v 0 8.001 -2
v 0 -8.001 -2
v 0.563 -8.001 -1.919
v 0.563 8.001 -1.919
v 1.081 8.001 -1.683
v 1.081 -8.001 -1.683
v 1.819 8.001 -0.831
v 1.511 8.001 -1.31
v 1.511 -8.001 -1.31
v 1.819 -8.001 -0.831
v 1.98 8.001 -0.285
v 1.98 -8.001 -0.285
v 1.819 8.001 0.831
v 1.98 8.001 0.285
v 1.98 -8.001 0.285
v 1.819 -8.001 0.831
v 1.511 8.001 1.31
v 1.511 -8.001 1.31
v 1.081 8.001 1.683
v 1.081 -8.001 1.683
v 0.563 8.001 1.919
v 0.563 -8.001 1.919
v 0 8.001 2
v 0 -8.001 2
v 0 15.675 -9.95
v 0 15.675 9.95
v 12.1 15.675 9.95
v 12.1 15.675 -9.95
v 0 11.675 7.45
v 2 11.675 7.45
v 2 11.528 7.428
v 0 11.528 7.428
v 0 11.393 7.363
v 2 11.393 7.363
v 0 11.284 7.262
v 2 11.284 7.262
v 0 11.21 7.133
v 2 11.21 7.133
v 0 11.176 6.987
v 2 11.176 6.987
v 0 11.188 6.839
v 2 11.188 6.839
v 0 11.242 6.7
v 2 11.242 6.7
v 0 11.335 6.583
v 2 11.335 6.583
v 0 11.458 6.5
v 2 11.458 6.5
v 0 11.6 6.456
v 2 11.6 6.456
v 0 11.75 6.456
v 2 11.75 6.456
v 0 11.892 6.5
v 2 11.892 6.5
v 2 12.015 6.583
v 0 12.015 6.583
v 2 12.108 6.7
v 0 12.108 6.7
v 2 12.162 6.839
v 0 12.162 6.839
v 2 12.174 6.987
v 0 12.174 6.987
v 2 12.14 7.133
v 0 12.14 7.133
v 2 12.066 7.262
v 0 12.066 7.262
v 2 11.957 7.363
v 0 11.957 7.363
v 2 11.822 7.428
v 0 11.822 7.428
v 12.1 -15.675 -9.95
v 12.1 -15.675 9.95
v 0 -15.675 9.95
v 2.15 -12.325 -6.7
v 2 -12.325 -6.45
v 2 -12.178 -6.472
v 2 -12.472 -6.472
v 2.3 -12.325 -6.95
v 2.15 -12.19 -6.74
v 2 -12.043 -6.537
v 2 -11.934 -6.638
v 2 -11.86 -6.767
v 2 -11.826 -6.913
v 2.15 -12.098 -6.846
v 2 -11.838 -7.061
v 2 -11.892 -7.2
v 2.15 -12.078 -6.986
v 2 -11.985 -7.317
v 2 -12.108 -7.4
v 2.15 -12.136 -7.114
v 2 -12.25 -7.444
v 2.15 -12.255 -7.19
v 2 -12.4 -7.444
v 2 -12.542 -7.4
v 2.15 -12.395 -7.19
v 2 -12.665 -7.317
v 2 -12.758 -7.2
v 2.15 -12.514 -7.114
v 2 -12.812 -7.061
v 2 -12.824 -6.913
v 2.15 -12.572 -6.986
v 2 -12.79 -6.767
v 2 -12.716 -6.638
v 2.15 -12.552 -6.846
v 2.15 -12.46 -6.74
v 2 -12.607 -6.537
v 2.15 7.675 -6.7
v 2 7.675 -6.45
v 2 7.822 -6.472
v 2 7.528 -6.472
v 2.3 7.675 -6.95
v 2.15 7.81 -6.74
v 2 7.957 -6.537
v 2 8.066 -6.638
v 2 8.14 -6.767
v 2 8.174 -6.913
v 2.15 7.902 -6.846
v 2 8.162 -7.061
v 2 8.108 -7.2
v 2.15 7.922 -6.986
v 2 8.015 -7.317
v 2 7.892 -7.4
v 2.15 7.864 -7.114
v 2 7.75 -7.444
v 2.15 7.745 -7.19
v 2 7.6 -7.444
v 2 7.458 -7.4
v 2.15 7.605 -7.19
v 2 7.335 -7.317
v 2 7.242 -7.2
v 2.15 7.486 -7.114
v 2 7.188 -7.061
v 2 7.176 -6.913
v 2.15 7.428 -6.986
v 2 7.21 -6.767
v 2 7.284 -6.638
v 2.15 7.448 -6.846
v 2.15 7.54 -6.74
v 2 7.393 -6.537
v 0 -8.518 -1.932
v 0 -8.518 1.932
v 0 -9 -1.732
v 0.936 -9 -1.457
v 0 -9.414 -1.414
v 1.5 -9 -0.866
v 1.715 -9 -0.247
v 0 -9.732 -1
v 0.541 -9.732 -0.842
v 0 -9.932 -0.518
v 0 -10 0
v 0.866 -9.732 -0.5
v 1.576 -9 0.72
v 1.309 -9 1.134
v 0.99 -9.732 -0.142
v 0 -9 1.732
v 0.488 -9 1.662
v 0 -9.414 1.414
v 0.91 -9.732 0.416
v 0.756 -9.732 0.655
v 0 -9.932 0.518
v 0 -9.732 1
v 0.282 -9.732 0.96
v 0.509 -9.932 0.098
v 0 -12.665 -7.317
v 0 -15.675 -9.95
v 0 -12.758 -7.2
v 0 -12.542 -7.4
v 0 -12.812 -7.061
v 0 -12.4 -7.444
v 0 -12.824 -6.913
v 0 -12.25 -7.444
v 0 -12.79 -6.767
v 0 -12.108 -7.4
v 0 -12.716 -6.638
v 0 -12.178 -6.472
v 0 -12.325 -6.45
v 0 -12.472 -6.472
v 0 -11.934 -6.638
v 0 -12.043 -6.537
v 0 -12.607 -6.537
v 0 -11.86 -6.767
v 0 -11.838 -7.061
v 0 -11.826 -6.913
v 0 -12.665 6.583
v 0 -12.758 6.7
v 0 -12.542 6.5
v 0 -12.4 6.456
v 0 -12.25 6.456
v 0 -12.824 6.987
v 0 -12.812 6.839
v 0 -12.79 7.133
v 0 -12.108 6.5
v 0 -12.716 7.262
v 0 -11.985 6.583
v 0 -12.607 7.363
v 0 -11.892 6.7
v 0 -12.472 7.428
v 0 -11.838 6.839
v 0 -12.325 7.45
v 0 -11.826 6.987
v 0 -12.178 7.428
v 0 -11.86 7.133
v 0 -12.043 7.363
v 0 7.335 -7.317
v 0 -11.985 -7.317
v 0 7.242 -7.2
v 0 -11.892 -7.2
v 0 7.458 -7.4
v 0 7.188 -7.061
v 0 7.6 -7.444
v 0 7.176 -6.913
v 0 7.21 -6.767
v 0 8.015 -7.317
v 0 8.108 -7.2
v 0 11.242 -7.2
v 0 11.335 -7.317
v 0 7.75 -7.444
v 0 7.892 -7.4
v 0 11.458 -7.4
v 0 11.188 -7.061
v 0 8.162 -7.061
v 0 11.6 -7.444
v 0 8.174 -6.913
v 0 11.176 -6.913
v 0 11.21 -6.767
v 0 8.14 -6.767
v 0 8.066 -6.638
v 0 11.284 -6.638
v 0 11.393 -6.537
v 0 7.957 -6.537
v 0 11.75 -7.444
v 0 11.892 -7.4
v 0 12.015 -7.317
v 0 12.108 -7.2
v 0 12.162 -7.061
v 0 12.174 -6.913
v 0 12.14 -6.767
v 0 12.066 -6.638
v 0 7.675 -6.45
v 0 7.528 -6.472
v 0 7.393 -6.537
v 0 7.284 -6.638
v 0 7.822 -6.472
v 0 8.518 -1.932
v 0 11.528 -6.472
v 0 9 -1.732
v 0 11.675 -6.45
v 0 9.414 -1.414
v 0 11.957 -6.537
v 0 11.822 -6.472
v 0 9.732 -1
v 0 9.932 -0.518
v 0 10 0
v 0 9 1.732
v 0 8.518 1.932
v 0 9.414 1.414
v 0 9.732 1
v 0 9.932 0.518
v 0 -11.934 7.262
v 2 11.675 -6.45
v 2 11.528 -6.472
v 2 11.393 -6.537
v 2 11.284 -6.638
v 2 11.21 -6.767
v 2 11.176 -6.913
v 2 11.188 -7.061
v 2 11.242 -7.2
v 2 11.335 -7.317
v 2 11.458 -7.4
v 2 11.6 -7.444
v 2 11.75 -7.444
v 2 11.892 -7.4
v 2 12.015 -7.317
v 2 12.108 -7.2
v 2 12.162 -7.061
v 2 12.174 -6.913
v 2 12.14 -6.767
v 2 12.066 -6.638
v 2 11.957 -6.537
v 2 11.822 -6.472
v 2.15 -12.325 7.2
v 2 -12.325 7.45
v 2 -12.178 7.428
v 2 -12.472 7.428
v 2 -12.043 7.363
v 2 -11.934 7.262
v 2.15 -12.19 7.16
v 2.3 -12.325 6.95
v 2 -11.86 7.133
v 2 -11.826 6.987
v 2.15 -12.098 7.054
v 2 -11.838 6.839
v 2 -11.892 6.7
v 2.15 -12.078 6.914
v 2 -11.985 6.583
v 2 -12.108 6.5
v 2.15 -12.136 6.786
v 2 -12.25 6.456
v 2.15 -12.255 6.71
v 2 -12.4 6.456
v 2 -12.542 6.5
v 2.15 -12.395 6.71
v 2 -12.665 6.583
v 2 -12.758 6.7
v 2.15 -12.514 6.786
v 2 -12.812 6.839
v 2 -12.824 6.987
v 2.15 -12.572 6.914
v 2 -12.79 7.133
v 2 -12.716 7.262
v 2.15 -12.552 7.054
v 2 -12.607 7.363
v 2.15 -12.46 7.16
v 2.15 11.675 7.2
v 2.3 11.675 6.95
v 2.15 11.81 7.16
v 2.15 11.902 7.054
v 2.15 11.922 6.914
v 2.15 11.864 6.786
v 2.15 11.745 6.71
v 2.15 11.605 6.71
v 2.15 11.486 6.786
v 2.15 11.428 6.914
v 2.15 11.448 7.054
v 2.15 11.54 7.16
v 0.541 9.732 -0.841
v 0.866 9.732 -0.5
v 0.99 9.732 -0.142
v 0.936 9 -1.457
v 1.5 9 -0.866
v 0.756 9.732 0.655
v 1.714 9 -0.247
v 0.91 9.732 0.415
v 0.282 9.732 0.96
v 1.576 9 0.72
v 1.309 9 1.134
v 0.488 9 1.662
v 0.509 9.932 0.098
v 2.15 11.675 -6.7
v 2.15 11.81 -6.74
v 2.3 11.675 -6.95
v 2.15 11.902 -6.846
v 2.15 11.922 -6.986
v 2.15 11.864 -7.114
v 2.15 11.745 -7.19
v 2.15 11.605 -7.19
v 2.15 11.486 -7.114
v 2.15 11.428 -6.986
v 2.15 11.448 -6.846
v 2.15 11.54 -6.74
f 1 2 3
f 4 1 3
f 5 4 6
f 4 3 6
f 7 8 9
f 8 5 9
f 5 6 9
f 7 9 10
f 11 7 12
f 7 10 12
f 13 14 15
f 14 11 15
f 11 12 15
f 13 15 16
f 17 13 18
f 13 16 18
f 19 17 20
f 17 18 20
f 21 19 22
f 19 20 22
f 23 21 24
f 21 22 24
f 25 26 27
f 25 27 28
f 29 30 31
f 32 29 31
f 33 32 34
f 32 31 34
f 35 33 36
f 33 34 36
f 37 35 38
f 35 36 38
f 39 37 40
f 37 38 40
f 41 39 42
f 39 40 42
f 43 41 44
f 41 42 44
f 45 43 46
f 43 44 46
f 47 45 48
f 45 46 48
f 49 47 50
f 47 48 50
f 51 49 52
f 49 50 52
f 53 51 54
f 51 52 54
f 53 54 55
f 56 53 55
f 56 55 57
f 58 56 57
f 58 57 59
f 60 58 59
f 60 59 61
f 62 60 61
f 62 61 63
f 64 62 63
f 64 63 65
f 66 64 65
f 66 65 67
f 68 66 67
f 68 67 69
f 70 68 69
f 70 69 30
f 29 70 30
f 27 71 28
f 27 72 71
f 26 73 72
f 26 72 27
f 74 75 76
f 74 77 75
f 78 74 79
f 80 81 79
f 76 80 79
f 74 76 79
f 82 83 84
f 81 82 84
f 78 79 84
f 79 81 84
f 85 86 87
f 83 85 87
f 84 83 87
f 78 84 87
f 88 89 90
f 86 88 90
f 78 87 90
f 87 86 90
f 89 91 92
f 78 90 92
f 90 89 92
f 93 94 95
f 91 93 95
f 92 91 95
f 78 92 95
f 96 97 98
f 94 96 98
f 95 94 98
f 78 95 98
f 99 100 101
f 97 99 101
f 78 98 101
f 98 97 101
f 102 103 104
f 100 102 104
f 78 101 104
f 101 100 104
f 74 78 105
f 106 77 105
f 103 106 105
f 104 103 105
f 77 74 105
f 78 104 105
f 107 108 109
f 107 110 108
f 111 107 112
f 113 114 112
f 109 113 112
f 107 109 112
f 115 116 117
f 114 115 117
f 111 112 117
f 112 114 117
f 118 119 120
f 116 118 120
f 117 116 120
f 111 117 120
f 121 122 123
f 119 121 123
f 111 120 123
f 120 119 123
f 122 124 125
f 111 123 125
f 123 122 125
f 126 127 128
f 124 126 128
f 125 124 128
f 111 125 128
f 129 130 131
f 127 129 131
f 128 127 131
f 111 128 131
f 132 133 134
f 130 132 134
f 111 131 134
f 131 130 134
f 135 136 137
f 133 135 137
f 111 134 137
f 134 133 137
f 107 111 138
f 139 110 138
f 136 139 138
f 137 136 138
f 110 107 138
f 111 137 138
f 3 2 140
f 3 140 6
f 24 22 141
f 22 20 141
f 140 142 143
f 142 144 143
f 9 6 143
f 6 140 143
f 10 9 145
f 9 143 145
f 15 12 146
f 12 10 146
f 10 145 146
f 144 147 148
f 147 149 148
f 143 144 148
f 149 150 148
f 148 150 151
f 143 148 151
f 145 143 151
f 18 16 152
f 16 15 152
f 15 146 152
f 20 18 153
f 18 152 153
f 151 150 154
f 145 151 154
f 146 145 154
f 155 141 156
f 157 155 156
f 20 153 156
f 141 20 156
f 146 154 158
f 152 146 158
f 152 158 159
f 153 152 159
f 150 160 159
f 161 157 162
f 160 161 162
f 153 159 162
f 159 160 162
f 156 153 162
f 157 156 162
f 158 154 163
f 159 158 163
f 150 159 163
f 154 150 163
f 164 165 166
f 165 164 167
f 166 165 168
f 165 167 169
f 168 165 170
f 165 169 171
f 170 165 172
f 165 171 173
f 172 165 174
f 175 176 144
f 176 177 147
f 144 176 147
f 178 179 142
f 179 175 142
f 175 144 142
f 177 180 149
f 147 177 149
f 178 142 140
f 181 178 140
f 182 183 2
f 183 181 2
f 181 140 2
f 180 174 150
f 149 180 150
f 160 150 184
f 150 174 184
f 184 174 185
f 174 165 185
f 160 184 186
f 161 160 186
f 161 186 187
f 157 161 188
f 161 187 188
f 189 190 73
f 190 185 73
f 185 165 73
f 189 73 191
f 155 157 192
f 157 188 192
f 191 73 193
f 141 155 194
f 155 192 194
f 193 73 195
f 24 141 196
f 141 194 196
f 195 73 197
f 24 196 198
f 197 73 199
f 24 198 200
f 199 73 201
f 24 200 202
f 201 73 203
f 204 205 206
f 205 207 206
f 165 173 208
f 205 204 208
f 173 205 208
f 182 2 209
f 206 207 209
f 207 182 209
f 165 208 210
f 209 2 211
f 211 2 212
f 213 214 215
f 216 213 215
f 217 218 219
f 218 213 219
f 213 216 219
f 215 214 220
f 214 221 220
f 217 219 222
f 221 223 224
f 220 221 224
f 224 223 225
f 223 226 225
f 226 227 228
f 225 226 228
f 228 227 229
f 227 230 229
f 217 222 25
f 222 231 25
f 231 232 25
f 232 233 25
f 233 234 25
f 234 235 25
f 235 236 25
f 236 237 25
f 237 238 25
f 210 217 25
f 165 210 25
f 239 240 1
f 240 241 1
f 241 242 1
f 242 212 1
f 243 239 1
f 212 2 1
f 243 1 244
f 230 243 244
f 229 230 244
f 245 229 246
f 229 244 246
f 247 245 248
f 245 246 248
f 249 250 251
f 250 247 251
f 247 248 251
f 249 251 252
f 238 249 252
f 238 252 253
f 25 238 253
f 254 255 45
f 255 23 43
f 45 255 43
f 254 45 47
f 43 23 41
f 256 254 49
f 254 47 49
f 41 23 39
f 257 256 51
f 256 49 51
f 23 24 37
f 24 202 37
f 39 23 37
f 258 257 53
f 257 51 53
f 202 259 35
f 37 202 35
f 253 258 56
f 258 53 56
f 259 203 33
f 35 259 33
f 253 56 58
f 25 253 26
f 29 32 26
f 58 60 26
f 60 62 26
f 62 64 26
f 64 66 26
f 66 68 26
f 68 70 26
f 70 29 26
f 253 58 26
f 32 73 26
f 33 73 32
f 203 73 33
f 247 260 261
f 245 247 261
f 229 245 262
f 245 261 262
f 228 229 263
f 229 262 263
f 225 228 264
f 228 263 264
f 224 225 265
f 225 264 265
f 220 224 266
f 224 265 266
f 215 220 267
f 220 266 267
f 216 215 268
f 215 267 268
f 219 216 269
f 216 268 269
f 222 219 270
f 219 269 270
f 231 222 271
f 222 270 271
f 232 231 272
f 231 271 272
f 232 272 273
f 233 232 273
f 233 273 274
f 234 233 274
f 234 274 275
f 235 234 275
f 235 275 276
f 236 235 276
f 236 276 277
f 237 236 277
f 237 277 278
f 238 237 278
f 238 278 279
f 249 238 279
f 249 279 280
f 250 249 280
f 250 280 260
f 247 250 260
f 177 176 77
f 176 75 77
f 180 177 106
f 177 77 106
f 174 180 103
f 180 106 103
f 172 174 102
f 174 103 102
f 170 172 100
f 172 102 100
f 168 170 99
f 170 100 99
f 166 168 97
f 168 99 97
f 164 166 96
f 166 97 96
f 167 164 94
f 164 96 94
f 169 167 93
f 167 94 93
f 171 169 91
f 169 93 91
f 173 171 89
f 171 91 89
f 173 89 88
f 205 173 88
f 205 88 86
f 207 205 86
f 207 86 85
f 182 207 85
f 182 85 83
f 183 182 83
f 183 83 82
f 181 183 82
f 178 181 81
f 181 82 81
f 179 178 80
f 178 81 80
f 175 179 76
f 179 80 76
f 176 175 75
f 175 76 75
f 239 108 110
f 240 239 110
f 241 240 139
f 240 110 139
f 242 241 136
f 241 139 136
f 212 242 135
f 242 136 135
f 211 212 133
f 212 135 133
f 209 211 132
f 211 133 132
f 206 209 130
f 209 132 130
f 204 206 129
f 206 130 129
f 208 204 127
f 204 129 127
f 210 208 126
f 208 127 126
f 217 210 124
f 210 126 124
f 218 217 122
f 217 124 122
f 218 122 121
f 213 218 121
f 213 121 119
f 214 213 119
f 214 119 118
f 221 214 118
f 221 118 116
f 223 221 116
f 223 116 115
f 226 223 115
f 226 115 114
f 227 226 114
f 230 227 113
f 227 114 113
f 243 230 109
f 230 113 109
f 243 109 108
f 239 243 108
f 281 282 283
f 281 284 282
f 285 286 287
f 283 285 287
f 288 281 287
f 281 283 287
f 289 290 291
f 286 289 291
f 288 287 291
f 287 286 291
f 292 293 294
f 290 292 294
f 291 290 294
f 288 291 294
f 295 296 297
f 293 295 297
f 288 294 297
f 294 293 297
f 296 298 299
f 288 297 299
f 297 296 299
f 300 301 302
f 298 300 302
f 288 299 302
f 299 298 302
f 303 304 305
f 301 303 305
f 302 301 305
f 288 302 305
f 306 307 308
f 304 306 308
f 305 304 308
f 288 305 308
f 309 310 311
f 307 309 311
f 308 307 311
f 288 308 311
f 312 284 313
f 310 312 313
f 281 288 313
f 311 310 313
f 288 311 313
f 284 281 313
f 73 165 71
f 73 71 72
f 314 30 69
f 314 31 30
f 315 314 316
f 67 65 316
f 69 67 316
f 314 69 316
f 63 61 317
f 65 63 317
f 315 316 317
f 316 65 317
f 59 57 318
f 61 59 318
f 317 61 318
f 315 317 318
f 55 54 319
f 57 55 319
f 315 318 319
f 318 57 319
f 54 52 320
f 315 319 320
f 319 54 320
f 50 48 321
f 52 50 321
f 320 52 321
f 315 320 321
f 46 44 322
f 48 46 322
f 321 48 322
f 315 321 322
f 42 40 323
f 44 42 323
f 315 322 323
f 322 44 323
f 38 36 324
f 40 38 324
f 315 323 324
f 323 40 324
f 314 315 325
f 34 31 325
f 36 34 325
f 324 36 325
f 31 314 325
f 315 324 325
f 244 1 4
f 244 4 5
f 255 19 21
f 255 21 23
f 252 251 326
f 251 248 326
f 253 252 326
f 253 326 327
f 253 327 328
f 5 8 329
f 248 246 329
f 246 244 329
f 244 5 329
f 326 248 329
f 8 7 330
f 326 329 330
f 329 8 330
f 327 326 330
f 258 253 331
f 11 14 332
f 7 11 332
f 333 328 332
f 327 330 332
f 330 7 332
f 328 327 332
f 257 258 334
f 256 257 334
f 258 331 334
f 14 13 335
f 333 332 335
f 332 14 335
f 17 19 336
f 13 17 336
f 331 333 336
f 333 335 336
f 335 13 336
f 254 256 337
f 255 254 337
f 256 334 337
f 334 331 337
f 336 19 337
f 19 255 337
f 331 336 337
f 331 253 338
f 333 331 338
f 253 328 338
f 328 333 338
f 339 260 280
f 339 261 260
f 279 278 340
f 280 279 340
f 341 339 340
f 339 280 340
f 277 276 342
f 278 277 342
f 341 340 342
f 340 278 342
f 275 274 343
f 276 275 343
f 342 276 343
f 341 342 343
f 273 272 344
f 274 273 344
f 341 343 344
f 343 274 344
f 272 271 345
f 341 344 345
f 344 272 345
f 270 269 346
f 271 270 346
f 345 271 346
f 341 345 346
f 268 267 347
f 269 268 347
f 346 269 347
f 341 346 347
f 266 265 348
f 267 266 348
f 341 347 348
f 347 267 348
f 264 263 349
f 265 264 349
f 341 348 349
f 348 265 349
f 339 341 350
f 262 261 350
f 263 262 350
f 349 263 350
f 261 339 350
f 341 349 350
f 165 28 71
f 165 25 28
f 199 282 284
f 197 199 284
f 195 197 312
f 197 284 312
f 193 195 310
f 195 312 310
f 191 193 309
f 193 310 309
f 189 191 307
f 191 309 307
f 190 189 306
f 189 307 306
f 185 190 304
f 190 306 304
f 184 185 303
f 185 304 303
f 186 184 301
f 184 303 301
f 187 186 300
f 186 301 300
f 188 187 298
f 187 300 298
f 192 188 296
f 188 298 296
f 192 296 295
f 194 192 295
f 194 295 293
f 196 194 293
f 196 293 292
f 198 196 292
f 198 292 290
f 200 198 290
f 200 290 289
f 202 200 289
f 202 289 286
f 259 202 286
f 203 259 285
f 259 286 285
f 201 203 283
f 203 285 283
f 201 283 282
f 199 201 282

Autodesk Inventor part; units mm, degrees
ref_plane "YZ Plane" through (0, 0, 0) normal (1, 0, 0) x (0, 1, 0)
ref_plane "XZ Plane" through (0, 0, 0) normal (0, 1, 0) x (-1, 0, 0)
ref_plane "XY Plane" through (0, 0, 0) normal (0, 0, 1) x (1, 0, 0)
sketch "Skizze4" plane through (0, 0, 0) normal (1, 0, 0) x (0, 1, 0)
  line L0 (-15.675, 9.95) -> (15.675, 9.95)
  line L1 (15.675, 9.95) -> (15.675, -9.95)
  line L2 (15.675, -9.95) -> (-15.675, -9.95)
  line L3 (-15.675, -9.95) -> (-15.675, 9.95)
  line L4 (0, -13.93) -> (0, 13.93) construction
  line L5 (-21.945, 0) -> (21.945, 0) construction
  point P0 (0, 0)
  dimension "d4" = 31.35
  dimension "d5" = 19.9
extrude "Extrusion2" add sketch "Skizze4" along normal blind 12.1
sketch "Skizze5" plane through (0, 0, 0) normal (0, 1, 0) x (-1, 0, 0)
  circle A0 centre (0, 0) radius 2
  dimension "d8" = 4
extrude "Extrusion3" cut sketch "Skizze5" along normal mid plane 20
fillet "Rundung1" radius 2 2 edges at (2, -10, 0) (2, 10, 0)
sketch "Skizze6" plane through (0, 0, 0) normal (-1, 0, 0) x (0, 0, 1)
  line L0 (-6.95, 7.675) -> (-6.95, -12.325) construction
  line L1 (9.95, 15.675) -> (-9.95, 15.675) construction
  line L2 (-9.95, 15.675) -> (-9.95, -15.675) construction
  line L3 (-6.95, 11.675) -> (6.95, 11.675) construction
  line L4 (6.95, 11.675) -> (6.95, -12.325) construction
  line L5 (9.95, -15.675) -> (9.95, 15.675) construction
  point P0 (0, 0)
  dimension "d12" = 4
  dimension "d15" = 4
  dimension "d16" = 24
  dimension "d17" = 3
  dimension "d18" = 24
  dimension "d19" = 3
hole "Bohrung1" at (0, 7.675, -6.95) at (0, 11.675, -6.95) at (0, -12.325, -6.95) at (0, 11.675, 6.95) at (0, -12.325, 6.95) direction (1, 0, 0) diameter 1 depth 2 tip angle 118
sketch "Skizze7" plane through (12.1, 0, 0) normal (1, 0, 0) x (0, 0, -1)
  line L0 (-8.0362, 11.2286) -> (8.4274, 11.2286) construction
  line L1 (8.4274, 11.2286) -> (8.4274, -13.5124) construction
  line L2 (8.4274, -13.5124) -> (-8.0362, -13.5124) construction
  line L3 (-8.0362, -13.5124) -> (-8.0362, 11.2286) construction
  point P0 (0, 0)
equation "\"d19\" = d17"
properties part number "LDD-1000LW" material "Kst - PTFE(white)"
